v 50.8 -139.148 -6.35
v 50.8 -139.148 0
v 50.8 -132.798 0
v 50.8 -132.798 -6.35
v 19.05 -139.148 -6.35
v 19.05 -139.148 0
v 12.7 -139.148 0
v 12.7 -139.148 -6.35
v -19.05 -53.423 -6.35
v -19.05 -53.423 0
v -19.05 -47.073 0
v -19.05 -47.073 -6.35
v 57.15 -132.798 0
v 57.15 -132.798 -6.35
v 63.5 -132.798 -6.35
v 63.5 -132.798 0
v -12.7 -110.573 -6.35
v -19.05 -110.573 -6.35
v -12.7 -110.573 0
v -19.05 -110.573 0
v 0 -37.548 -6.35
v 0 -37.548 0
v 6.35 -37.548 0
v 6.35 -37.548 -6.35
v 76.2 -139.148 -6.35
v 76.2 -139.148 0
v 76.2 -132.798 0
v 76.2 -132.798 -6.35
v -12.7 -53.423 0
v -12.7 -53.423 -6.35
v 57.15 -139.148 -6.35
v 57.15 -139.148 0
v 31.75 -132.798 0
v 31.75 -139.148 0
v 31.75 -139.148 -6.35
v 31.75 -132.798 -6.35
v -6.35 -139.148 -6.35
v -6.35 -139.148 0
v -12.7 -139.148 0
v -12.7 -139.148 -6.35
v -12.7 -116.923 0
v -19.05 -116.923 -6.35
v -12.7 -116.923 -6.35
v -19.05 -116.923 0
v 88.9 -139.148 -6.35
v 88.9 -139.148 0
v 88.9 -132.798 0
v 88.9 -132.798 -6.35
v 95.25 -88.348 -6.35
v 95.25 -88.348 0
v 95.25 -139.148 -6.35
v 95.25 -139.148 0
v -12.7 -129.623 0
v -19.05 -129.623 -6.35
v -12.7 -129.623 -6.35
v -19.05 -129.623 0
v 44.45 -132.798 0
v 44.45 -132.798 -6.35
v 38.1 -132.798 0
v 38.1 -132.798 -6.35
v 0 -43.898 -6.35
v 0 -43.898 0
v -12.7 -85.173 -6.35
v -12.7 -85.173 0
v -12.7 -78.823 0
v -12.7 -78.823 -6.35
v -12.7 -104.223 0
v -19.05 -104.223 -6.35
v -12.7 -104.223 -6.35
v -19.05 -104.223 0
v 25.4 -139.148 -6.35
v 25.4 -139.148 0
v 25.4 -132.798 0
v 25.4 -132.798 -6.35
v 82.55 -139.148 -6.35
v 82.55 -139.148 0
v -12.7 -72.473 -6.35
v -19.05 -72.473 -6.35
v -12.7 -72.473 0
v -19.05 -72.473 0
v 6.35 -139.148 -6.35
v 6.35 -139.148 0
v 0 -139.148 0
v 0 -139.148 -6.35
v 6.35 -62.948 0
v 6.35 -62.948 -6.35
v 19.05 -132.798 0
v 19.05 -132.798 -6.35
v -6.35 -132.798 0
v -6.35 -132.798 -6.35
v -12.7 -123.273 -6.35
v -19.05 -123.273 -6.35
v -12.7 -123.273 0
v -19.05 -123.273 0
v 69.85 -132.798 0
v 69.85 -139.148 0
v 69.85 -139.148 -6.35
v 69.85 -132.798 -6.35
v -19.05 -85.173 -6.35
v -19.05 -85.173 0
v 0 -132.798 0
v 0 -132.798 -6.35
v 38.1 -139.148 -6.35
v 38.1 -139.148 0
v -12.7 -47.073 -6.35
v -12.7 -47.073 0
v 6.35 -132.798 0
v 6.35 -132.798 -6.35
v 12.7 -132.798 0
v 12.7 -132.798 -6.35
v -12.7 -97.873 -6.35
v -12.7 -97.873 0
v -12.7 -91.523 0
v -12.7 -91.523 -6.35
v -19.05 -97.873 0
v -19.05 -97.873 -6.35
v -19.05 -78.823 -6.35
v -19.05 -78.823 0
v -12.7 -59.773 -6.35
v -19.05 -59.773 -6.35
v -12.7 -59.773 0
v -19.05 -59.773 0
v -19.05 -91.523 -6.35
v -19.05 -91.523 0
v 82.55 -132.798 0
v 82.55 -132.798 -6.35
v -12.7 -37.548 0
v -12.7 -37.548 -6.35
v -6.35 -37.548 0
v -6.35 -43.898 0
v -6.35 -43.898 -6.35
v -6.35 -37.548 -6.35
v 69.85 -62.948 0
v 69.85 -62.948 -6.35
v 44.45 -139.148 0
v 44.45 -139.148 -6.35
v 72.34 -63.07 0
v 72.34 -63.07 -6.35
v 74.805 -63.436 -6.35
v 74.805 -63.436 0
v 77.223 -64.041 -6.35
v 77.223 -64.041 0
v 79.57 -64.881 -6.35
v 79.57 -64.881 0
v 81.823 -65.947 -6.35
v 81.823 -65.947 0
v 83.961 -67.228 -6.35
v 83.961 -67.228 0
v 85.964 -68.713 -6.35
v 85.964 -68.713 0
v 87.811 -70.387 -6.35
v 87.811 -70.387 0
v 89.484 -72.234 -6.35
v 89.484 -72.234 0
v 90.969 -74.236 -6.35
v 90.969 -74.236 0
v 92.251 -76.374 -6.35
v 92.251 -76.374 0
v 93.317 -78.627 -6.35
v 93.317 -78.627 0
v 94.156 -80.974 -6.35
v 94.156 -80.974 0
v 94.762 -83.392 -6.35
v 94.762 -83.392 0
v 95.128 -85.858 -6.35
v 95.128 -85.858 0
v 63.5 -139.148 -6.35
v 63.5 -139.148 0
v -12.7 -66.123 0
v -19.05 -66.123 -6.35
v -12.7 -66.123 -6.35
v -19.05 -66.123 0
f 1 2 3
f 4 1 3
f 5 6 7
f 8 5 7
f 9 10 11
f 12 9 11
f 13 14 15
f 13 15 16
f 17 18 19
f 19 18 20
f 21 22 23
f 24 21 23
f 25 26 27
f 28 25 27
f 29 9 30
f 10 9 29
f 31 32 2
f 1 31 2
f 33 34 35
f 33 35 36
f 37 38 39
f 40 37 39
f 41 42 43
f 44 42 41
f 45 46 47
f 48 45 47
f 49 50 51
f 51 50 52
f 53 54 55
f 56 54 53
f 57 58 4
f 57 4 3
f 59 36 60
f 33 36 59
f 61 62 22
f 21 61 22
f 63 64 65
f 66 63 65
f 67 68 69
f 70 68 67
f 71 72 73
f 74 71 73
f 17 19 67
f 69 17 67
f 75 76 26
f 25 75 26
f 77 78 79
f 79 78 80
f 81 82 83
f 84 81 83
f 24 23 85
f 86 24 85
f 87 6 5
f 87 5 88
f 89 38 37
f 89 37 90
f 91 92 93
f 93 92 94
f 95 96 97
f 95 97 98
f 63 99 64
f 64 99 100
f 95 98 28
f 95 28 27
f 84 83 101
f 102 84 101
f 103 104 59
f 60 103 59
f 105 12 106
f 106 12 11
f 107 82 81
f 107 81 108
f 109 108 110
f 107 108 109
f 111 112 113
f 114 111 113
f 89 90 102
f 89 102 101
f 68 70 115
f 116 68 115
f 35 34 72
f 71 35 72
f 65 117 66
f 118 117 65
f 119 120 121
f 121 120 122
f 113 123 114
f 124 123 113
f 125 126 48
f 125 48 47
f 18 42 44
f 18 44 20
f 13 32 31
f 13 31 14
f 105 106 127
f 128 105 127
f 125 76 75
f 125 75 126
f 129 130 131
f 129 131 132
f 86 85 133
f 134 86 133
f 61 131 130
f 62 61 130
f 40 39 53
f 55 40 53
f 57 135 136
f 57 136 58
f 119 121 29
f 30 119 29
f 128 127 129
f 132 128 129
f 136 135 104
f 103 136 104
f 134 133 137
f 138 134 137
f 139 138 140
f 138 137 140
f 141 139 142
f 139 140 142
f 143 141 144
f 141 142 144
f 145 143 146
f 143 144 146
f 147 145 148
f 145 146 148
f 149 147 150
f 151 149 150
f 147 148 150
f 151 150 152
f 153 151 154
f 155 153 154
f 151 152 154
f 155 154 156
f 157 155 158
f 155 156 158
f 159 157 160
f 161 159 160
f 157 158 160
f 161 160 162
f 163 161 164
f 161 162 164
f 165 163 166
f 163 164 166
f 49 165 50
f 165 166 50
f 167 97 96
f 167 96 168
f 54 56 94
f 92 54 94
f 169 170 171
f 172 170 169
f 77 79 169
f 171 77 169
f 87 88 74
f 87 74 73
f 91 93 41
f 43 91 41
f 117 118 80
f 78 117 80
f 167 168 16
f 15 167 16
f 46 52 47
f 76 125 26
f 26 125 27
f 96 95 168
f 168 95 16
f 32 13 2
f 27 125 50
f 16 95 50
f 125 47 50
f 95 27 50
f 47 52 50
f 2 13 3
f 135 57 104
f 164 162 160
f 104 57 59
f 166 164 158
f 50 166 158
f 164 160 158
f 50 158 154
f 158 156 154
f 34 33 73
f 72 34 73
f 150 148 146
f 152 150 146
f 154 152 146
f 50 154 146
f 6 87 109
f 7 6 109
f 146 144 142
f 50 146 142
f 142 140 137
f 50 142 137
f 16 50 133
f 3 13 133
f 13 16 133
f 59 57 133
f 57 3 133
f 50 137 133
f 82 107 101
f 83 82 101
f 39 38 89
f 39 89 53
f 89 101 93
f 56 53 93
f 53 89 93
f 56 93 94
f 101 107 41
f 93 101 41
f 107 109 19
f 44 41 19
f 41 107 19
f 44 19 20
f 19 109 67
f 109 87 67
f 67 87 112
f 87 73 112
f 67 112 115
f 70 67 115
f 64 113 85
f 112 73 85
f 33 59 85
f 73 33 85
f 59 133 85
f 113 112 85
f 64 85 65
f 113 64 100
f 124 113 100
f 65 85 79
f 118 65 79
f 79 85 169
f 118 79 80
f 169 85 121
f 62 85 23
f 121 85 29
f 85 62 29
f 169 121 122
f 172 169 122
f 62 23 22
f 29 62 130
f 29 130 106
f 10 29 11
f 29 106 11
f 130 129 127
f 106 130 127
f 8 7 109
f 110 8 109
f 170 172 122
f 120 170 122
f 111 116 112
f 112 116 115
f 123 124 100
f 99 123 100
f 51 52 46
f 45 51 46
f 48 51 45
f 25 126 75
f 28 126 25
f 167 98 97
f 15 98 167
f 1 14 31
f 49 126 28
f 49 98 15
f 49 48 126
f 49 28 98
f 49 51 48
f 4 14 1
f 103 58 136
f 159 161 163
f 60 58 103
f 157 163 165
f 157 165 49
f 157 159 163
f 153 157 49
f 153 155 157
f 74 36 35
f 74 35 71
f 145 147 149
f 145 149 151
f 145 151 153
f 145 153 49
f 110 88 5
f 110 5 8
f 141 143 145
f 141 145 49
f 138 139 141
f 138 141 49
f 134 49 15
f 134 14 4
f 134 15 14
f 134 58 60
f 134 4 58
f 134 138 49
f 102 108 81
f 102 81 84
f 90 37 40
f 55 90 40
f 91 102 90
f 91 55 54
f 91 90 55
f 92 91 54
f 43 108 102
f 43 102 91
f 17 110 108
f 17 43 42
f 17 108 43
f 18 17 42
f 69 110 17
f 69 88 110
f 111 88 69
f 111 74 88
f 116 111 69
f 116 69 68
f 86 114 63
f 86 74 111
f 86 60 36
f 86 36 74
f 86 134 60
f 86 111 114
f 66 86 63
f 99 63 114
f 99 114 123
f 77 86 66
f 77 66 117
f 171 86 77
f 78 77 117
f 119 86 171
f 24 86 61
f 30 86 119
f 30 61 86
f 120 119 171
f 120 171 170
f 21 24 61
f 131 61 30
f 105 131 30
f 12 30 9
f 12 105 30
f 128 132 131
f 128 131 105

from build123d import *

# Parameters (mm, degrees)
BOSS_EXTRUDE1_DEPTH = 6.35
CAVITY2_START       = -19.049999998
CAVITY2_OUTLINE_W   = 9.525
CAVITY2_OUTLINE_H   = 6.35
CAVITY2_OUTLINE_W_2 = 6.35
CAVITY2_DEPTH       = 6.35
CAVITY2_START_2     = -6.349999998
CAVITY2_2_OUTLINE_W = 6.35
CAVITY2_2_OUTLINE_H = 6.35
CAVITY2_2_DEPTH     = 6.35
CAVITY2_START_3     = 6.350000002
CAVITY2_3_OUTLINE_W = 6.35
CAVITY2_3_OUTLINE_H = 6.35
CAVITY2_3_DEPTH     = 6.35
CAVITY2_START_4     = 19.050000002
CAVITY2_4_OUTLINE_W = 6.35
CAVITY2_4_OUTLINE_H = 6.35
CAVITY2_4_DEPTH     = 6.35
CAVITY2_START_5     = 31.750000002
CAVITY2_5_OUTLINE_W = 6.35
CAVITY2_5_OUTLINE_H = 6.35
CAVITY2_5_DEPTH     = 6.35
CAVITY2_START_6     = 44.450000002
CAVITY2_6_OUTLINE_W = 6.35
CAVITY2_6_OUTLINE_H = 6.35
CAVITY2_6_DEPTH     = 6.35
CAVITY2_START_7     = 57.150000002
CAVITY2_7_OUTLINE_W = 6.35
CAVITY2_7_OUTLINE_H = 6.35
CAVITY2_7_DEPTH     = 6.35
CAVITY2_START_8     = 69.850000002
CAVITY2_8_OUTLINE_W = 6.35
CAVITY2_8_OUTLINE_H = 6.35
CAVITY2_8_DEPTH     = 6.35
CAVITY2_START_9     = 82.550000002
CAVITY2_9_OUTLINE_W = 6.35
CAVITY2_9_OUTLINE_H = 6.35
CAVITY2_9_DEPTH     = 6.35


# Read off the part's stored shape, not the designer's step: Cavity2
with BuildPart() as part:
    # Sketch1 → Boss-Extrude1 (new body)
    with BuildSketch(Plane.XY):
        with BuildLine():
            Line((-19.049999998, -37.547541155), (6.350000002, -37.547541155))
            Line((6.350000002, -37.547541155), (6.350000002, -62.947541155))
            Line((6.350000002, -62.947541155), (69.850000002, -62.947541155))
            ThreePointArc((69.850000002, -62.947541155), (87.810512244, -70.387028913), (95.250000002, -88.347541155))
            Line((95.250000002, -88.347541155), (95.250000002, -139.147541155))
            Line((95.250000002, -139.147541155), (-19.049999998, -139.147541155))
            Line((-19.049999998, -139.147541155), (-19.049999998, -37.547541155))
        make_face()
    extrude(amount=-BOSS_EXTRUDE1_DEPTH)

    # Cavity2 outline → Cavity2 (cut)
    with BuildSketch(Plane.YZ.offset(CAVITY2_START)):
        with Locations((-134.385041155, -3.175)):
            Rectangle(CAVITY2_OUTLINE_W, CAVITY2_OUTLINE_H)
        with Locations((-120.097541155, -3.175)):
            Rectangle(CAVITY2_OUTLINE_W_2, CAVITY2_OUTLINE_H)
        with Locations((-107.397541155, -3.175)):
            Rectangle(CAVITY2_OUTLINE_W_2, CAVITY2_OUTLINE_H)
        with Locations((-94.697541155, -3.175)):
            Rectangle(CAVITY2_OUTLINE_W_2, CAVITY2_OUTLINE_H)
        with Locations((-81.997541155, -3.175)):
            Rectangle(CAVITY2_OUTLINE_W_2, CAVITY2_OUTLINE_H)
        with Locations((-69.297541155, -3.175)):
            Rectangle(CAVITY2_OUTLINE_W_2, CAVITY2_OUTLINE_H)
        with Locations((-56.597541155, -3.175)):
            Rectangle(CAVITY2_OUTLINE_W_2, CAVITY2_OUTLINE_H)
        with Locations((-42.310041155, -3.175)):
            Rectangle(CAVITY2_OUTLINE_W, CAVITY2_OUTLINE_H)
    extrude(amount=CAVITY2_DEPTH, mode=Mode.SUBTRACT)

    # Cavity2 2 outline → Cavity2 2 (cut)
    with BuildSketch(Plane.YZ.offset(CAVITY2_START_2)):
        with Locations((-135.972541155, -3.175)):
            Rectangle(CAVITY2_2_OUTLINE_W, CAVITY2_2_OUTLINE_H)
        with Locations((-40.722541155, -3.175)):
            Rectangle(CAVITY2_2_OUTLINE_W, CAVITY2_2_OUTLINE_H)
    extrude(amount=CAVITY2_2_DEPTH, mode=Mode.SUBTRACT)

    # Cavity2 3 outline → Cavity2 3 (cut)
    with BuildSketch(Plane.YZ.offset(CAVITY2_START_3)):
        with Locations((-135.972541155, -3.175)):
            Rectangle(CAVITY2_3_OUTLINE_W, CAVITY2_3_OUTLINE_H)
    extrude(amount=CAVITY2_3_DEPTH, mode=Mode.SUBTRACT)

    # Cavity2 4 outline → Cavity2 4 (cut)
    with BuildSketch(Plane.YZ.offset(CAVITY2_START_4)):
        with Locations((-135.972541155, -3.175)):
            Rectangle(CAVITY2_4_OUTLINE_W, CAVITY2_4_OUTLINE_H)
    extrude(amount=CAVITY2_4_DEPTH, mode=Mode.SUBTRACT)

    # Cavity2 5 outline → Cavity2 5 (cut)
    with BuildSketch(Plane.YZ.offset(CAVITY2_START_5)):
        with Locations((-135.972541155, -3.175)):
            Rectangle(CAVITY2_5_OUTLINE_W, CAVITY2_5_OUTLINE_H)
    extrude(amount=CAVITY2_5_DEPTH, mode=Mode.SUBTRACT)

    # Cavity2 6 outline → Cavity2 6 (cut)
    with BuildSketch(Plane.YZ.offset(CAVITY2_START_6)):
        with Locations((-135.972541155, -3.175)):
            Rectangle(CAVITY2_6_OUTLINE_W, CAVITY2_6_OUTLINE_H)
    extrude(amount=CAVITY2_6_DEPTH, mode=Mode.SUBTRACT)

    # Cavity2 7 outline → Cavity2 7 (cut)
    with BuildSketch(Plane.YZ.offset(CAVITY2_START_7)):
        with Locations((-135.972541155, -3.175)):
            Rectangle(CAVITY2_7_OUTLINE_W, CAVITY2_7_OUTLINE_H)
    extrude(amount=CAVITY2_7_DEPTH, mode=Mode.SUBTRACT)

    # Cavity2 8 outline → Cavity2 8 (cut)
    with BuildSketch(Plane.YZ.offset(CAVITY2_START_8)):
        with Locations((-135.972541155, -3.175)):
            Rectangle(CAVITY2_8_OUTLINE_W, CAVITY2_8_OUTLINE_H)
    extrude(amount=CAVITY2_8_DEPTH, mode=Mode.SUBTRACT)

    # Cavity2 9 outline → Cavity2 9 (cut)
    with BuildSketch(Plane.YZ.offset(CAVITY2_START_9)):
        with Locations((-135.972541155, -3.175)):
            Rectangle(CAVITY2_9_OUTLINE_W, CAVITY2_9_OUTLINE_H)
    extrude(amount=CAVITY2_9_DEPTH, mode=Mode.SUBTRACT)


solid = part.part
